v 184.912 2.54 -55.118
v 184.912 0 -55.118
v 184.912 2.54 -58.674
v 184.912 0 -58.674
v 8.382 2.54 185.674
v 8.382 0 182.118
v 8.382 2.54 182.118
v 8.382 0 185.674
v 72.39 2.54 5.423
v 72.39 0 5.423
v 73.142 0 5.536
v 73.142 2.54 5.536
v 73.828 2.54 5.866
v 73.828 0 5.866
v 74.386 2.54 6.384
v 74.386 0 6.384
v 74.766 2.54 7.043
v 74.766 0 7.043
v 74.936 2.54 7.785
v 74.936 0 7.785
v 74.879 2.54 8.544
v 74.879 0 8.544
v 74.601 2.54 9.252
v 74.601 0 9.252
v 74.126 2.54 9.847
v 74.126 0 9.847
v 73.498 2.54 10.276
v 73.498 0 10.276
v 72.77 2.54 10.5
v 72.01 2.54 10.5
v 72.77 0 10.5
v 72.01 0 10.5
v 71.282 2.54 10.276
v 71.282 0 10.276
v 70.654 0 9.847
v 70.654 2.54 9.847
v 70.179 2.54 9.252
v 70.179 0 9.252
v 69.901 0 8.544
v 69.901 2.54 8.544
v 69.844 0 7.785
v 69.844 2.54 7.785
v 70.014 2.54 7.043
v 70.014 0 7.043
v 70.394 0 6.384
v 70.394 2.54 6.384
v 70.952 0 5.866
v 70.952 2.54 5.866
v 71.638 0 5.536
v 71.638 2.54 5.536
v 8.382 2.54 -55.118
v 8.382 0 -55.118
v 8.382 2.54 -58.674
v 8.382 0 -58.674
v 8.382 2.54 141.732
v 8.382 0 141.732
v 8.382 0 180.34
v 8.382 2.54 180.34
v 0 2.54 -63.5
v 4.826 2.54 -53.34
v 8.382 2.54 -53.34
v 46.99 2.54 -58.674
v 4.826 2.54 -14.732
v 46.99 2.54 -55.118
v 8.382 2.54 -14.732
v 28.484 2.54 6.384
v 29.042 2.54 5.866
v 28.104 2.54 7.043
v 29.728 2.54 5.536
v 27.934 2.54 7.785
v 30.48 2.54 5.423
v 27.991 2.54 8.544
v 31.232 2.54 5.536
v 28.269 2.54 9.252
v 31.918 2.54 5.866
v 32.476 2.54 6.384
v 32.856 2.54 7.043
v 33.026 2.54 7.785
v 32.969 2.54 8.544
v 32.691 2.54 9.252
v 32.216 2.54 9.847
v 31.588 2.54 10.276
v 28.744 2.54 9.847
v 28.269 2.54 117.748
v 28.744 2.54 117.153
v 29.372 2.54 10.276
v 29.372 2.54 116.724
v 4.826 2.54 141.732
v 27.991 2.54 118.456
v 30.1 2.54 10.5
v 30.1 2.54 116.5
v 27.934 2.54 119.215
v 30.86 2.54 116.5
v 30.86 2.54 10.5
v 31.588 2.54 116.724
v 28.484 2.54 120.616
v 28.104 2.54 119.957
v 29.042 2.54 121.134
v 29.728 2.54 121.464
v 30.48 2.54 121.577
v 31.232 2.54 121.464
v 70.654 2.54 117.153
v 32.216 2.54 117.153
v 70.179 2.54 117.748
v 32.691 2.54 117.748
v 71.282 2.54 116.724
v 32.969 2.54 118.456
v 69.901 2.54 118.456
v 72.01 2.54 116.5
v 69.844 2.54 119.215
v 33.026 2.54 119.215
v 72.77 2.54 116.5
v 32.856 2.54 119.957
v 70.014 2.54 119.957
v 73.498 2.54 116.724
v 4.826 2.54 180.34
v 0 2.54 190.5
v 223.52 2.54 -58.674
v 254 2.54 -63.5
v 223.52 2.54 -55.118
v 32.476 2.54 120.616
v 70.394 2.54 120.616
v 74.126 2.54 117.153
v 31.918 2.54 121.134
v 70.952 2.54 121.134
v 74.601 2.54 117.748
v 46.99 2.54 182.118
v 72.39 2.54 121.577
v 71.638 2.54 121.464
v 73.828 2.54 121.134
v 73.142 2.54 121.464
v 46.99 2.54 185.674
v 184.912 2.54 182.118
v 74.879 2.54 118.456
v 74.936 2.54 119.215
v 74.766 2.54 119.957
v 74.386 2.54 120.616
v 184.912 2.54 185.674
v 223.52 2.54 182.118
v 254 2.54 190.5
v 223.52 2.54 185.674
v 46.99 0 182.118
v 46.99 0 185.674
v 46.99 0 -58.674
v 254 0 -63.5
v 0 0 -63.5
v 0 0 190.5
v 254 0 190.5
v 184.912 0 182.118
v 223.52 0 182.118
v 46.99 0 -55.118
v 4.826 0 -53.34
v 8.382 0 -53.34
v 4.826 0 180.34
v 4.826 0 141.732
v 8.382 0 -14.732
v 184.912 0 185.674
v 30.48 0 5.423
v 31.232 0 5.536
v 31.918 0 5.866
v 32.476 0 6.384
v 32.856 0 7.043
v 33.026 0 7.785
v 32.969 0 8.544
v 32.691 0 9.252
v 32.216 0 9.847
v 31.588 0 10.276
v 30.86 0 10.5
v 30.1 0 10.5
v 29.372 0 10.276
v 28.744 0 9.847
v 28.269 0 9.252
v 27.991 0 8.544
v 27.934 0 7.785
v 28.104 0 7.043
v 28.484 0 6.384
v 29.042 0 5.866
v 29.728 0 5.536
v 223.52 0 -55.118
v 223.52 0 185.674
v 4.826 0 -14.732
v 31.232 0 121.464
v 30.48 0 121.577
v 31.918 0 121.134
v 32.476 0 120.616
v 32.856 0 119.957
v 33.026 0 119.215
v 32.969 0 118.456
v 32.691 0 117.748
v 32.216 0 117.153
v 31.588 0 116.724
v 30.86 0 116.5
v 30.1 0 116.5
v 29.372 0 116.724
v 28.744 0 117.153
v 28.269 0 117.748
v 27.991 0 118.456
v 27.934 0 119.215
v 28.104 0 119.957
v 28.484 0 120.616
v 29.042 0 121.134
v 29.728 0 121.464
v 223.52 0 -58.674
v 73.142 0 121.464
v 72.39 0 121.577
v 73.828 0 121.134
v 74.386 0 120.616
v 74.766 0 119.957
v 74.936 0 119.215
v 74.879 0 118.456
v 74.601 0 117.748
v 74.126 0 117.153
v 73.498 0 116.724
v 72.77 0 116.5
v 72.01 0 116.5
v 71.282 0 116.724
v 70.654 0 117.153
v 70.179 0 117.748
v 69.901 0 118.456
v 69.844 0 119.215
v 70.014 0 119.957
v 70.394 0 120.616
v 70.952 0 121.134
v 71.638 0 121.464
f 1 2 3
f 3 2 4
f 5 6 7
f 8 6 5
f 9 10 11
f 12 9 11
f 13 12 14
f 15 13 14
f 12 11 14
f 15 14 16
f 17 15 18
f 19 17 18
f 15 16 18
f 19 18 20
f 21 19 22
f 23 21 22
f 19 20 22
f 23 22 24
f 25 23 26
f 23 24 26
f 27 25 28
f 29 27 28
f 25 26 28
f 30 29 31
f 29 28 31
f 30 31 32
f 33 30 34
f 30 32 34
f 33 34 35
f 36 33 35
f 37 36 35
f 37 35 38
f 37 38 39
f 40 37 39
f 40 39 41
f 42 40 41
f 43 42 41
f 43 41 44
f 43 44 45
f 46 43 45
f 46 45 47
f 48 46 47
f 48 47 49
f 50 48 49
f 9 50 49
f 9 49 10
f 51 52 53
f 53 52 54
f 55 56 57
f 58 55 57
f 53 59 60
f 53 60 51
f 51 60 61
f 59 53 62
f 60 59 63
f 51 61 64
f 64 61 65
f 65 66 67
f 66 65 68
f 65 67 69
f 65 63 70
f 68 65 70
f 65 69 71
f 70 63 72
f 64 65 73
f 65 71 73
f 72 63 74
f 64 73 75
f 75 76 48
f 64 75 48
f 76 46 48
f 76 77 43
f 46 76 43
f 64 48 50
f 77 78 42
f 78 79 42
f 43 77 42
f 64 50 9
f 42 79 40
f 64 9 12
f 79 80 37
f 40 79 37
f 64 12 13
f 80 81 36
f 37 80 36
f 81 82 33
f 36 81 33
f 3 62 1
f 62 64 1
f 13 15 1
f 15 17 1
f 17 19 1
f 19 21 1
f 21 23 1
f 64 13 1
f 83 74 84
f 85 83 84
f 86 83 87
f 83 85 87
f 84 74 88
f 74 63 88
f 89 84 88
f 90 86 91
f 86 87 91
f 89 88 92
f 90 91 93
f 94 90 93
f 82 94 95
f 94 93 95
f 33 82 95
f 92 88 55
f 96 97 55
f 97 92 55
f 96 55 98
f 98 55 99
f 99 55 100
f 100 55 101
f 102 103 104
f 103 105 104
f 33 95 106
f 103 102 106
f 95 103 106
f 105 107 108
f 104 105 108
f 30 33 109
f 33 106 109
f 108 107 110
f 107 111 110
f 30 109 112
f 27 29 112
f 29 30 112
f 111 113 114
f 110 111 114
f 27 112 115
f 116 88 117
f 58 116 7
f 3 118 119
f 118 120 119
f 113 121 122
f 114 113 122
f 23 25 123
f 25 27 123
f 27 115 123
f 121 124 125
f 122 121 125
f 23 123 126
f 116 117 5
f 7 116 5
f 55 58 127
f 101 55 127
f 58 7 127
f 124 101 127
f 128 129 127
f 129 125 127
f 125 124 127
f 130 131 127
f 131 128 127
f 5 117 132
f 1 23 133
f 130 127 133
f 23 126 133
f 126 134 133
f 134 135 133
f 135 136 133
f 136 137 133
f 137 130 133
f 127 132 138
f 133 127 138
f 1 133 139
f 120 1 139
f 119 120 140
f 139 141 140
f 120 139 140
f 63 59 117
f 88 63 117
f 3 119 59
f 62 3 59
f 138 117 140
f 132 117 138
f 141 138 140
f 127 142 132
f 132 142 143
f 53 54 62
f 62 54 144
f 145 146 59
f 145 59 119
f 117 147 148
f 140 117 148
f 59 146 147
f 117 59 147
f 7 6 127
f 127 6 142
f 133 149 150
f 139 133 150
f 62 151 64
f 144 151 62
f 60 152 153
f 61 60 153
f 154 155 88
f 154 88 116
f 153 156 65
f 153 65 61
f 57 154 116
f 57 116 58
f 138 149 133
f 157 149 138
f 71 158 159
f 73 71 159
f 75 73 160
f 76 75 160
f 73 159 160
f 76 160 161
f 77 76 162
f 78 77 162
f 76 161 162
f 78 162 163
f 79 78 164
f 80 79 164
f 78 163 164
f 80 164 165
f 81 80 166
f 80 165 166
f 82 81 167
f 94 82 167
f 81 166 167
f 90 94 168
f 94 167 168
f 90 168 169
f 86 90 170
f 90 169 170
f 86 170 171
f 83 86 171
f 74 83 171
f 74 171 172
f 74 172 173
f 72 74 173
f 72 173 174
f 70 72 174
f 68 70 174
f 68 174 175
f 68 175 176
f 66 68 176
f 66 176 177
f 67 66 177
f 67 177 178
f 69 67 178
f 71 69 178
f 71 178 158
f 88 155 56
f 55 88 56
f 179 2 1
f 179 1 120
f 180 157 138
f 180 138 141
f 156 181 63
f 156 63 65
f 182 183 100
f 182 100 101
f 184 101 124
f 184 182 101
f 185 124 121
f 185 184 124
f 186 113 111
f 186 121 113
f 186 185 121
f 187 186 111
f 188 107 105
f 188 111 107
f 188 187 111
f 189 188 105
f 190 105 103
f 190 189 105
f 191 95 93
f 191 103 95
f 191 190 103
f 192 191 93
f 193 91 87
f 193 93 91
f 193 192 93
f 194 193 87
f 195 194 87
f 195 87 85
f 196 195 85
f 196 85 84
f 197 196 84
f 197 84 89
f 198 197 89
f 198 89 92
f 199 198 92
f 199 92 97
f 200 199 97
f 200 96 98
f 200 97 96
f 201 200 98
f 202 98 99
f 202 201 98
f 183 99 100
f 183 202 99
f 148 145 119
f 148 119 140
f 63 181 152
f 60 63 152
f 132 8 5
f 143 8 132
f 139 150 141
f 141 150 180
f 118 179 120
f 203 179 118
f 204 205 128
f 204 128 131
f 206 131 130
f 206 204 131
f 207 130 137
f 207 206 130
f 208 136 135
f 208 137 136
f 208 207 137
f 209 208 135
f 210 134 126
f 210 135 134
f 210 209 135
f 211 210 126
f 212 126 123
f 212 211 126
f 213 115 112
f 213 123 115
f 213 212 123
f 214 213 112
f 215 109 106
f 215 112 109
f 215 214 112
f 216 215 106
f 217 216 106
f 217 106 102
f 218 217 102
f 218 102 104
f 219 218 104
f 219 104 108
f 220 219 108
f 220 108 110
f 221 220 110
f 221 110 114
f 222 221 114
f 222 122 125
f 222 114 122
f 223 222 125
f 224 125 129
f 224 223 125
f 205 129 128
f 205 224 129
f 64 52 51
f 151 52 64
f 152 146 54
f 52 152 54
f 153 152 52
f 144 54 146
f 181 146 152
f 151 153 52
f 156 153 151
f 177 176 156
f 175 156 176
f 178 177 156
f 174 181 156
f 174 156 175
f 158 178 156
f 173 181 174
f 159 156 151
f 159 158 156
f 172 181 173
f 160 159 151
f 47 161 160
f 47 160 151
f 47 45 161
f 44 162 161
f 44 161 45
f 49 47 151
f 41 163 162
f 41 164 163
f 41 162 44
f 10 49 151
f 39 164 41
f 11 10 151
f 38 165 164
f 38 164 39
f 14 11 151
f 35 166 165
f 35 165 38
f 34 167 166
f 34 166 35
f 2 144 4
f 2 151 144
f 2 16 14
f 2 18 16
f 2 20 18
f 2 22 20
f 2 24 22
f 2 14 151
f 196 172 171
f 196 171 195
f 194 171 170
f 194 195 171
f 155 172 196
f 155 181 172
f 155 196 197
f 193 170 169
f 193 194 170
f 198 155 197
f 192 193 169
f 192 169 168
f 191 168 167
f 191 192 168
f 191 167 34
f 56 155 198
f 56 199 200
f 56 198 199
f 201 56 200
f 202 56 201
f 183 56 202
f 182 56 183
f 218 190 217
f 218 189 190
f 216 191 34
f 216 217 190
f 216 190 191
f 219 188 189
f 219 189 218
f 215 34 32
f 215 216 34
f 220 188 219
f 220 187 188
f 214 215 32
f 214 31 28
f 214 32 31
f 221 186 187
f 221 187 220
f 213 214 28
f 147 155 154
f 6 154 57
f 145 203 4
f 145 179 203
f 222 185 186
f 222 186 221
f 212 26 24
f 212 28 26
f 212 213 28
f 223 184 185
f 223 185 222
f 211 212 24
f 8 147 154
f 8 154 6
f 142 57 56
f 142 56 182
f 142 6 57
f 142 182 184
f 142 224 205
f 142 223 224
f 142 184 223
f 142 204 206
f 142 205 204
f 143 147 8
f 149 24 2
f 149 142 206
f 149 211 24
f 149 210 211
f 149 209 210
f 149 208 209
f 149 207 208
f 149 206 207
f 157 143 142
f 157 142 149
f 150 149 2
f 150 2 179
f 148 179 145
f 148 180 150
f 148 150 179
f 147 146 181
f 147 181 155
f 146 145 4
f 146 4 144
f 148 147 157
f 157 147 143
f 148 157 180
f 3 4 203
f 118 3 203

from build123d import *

# Parameters (mm, degrees)
SKETCH1_W                  = 254
SKETCH1_H                  = 127
SKETCH1_W_2                = 38.608
SKETCH1_H_2                = 3.556
SKETCH1_W_3                = 3.556
SKETCH1_H_3                = 38.608
BOSS_EXTRUDE1_DEPTH        = 2.54
F_7_0_201_DIAMETER_HOLE1_D = 5.1054


with BuildPart() as part:
    # Sketch1 → Boss-Extrude1 (new body)
    with BuildSketch(Plane(origin=(0, 0, 0), x_dir=(1, 0, 0), z_dir=(0, 1, 0))):
        with Locations((127, 0)):
            Rectangle(SKETCH1_W, SKETCH1_H)
        with Locations((27.686, 56.896)):
            Rectangle(SKETCH1_W_2, SKETCH1_H_2, mode=Mode.SUBTRACT)
        with Locations((204.216, 56.896)):
            Rectangle(SKETCH1_W_2, SKETCH1_H_2, mode=Mode.SUBTRACT)
        with Locations((6.604, 34.036)):
            Rectangle(SKETCH1_W_3, SKETCH1_H_3, mode=Mode.SUBTRACT)
    boss_extrude1 = extrude(amount=BOSS_EXTRUDE1_DEPTH)

    # #7 (0.201) Diameter Hole1 (through all)
    with Locations(Plane(origin=(30.48, 2.54, 7.9756), x_dir=(0, 0, 1), z_dir=(0, 1, 0))):
        with Locations((0, 0), (0, 41.91)):
            f_7_0_201_diameter_hole1 = Hole(F_7_0_201_DIAMETER_HOLE1_D / 2)

    # Mirror1: Boss-Extrude1, #7 (0.201) Diameter Hole1 across plane
    add(boss_extrude1.mirror(Plane(origin=(0, 2.54, 63.5), x_dir=(1, 0, 0), z_dir=(0, 0, -1))))
    add(f_7_0_201_diameter_hole1.mirror(Plane(origin=(0, 2.54, 63.5), x_dir=(1, 0, 0), z_dir=(0, 0, -1))), mode=Mode.SUBTRACT)


solid = part.part
